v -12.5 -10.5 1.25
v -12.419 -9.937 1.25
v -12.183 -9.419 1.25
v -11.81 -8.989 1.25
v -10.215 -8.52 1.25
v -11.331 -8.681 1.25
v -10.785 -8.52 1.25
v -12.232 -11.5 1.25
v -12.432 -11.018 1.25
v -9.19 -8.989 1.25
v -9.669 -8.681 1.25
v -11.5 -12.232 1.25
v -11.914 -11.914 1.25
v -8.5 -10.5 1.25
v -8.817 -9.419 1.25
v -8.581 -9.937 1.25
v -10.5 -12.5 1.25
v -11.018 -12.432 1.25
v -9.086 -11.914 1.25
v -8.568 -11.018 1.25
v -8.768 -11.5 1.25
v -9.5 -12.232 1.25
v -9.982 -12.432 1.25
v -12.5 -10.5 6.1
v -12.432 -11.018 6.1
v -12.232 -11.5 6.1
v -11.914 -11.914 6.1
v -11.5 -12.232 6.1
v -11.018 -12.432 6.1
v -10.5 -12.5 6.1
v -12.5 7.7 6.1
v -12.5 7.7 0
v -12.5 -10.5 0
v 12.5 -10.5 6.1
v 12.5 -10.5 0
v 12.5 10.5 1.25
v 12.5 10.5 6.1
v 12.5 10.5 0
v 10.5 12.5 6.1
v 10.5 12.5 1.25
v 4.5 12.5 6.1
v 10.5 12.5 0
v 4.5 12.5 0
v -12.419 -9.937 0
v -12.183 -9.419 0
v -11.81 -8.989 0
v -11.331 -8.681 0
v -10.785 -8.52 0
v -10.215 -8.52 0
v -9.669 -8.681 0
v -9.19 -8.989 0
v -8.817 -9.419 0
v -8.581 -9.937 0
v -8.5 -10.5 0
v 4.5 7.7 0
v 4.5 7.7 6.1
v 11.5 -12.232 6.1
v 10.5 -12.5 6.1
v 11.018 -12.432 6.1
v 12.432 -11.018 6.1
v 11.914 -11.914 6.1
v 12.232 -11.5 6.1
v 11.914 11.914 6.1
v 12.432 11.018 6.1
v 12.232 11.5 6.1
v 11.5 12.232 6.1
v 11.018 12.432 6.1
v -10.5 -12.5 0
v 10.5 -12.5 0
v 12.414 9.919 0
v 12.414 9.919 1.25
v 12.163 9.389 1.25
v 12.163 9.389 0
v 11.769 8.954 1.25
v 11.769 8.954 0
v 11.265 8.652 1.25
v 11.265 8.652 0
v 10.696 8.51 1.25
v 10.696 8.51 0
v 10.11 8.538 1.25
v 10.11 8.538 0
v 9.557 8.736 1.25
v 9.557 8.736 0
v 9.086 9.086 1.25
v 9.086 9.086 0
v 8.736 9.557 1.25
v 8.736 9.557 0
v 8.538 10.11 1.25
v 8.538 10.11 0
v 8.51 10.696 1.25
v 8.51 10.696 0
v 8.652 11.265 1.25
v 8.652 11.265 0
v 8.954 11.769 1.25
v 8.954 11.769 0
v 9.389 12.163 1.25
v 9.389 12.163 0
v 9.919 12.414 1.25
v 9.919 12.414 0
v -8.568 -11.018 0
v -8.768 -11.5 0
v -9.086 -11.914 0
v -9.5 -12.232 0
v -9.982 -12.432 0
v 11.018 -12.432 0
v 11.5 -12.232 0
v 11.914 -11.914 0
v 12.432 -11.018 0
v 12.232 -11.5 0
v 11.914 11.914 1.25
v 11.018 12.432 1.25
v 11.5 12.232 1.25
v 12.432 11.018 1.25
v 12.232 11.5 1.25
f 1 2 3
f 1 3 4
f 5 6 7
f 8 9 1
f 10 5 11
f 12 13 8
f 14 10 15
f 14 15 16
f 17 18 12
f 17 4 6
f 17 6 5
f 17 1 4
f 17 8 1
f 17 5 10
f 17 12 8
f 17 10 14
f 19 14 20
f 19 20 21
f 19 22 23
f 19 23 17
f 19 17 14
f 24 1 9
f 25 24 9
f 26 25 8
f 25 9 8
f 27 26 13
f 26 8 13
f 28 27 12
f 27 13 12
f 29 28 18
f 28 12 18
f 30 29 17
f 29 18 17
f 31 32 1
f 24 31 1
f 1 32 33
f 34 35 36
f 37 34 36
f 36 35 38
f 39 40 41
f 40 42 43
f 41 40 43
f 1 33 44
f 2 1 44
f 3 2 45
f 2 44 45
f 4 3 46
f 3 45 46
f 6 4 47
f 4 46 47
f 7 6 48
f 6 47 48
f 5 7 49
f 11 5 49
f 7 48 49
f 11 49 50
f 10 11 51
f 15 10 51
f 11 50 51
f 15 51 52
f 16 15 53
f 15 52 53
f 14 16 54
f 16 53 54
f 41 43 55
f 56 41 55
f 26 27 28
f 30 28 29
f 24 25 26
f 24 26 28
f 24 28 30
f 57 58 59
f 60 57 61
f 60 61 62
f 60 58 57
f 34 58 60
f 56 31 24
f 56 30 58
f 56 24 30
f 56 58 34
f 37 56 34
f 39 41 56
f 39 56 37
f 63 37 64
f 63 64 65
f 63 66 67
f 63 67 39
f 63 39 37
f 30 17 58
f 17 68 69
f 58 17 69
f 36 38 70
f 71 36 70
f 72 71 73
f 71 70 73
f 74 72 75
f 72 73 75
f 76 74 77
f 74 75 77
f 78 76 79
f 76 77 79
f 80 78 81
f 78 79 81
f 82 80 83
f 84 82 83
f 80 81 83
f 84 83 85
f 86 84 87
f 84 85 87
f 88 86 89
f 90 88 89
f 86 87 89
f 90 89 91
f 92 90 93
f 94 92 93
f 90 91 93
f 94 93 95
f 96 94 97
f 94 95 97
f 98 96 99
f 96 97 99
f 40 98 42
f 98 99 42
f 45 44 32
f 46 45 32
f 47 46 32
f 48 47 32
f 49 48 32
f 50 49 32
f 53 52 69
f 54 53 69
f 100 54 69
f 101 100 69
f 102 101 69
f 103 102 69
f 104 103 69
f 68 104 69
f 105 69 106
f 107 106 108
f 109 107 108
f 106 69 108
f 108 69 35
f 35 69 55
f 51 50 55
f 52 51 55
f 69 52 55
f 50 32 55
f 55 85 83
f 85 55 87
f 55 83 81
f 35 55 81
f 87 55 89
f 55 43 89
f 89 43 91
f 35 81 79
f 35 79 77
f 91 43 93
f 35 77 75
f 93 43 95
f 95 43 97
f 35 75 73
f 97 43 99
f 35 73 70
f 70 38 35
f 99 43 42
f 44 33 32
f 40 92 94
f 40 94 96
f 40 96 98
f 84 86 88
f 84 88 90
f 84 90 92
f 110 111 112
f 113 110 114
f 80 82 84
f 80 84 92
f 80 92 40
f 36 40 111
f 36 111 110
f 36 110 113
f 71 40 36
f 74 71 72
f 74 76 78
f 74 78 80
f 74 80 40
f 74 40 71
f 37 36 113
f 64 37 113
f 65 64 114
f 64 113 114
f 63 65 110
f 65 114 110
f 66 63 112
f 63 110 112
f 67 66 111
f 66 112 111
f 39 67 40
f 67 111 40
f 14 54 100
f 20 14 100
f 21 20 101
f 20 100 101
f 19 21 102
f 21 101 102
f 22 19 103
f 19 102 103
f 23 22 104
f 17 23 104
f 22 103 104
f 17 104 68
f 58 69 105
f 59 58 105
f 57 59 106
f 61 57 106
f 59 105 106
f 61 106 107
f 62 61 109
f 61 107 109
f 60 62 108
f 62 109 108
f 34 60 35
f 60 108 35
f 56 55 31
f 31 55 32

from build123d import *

# Parameters (mm, degrees)
F1_DEPTH = 6.1
F3_DEPTH = 1.25


# Not quite as in the source:
# - a feature names something its author has since deleted; it is built from what else it names


with BuildPart() as f1:
    # F0 (on Top) → F1 (new body)
    with BuildSketch(Plane.XY):
        with BuildLine():
            ThreePointArc((12.5, 10.5), (11.9142135624, 11.9142135624), (10.5, 12.5))
            Line((10.5, 12.5), (4.5, 12.5))
            Line((4.5, 12.5), (4.5, 7.7))
            Line((4.5, 7.7), (-12.5, 7.7))
            Line((-12.5, 7.7), (-12.5, -10.5))
            ThreePointArc((-12.5, -10.5), (-11.9142135624, -11.9142135624), (-10.5, -12.5))
            Line((-10.5, -12.5), (10.5, -12.5))
            ThreePointArc((10.5, -12.5), (11.9142135624, -11.9142135624), (12.5, -10.5))
            Line((12.5, -10.5), (12.5, 10.5))
        make_face()
    extrude(amount=F1_DEPTH)

    # F2 (on face) → F3 (cut)
    with BuildSketch(Plane(origin=(0, 0, 0), x_dir=(1, 0, 0), z_dir=(0, 0, -1))):
        with BuildLine():
            ThreePointArc((10.5, -12.5), (11.9142135624, -11.9142135624), (12.5, -10.5))
            ThreePointArc((12.5, -10.5), (9.0857864376, -9.0857864376), (10.5, -12.5))
        make_face()
        with BuildLine():
            ThreePointArc((-8.5, 10.5), (-9.0857864376, 11.9142135624), (-10.5, 12.5))
            ThreePointArc((-10.5, 12.5), (-11.9142135624, 11.9142135624), (-12.5, 10.5))
            ThreePointArc((-12.5, 10.5), (-10.5, 8.5), (-8.5, 10.5))
        make_face()
    extrude(amount=-F3_DEPTH, mode=Mode.SUBTRACT)


solid = f1.part
